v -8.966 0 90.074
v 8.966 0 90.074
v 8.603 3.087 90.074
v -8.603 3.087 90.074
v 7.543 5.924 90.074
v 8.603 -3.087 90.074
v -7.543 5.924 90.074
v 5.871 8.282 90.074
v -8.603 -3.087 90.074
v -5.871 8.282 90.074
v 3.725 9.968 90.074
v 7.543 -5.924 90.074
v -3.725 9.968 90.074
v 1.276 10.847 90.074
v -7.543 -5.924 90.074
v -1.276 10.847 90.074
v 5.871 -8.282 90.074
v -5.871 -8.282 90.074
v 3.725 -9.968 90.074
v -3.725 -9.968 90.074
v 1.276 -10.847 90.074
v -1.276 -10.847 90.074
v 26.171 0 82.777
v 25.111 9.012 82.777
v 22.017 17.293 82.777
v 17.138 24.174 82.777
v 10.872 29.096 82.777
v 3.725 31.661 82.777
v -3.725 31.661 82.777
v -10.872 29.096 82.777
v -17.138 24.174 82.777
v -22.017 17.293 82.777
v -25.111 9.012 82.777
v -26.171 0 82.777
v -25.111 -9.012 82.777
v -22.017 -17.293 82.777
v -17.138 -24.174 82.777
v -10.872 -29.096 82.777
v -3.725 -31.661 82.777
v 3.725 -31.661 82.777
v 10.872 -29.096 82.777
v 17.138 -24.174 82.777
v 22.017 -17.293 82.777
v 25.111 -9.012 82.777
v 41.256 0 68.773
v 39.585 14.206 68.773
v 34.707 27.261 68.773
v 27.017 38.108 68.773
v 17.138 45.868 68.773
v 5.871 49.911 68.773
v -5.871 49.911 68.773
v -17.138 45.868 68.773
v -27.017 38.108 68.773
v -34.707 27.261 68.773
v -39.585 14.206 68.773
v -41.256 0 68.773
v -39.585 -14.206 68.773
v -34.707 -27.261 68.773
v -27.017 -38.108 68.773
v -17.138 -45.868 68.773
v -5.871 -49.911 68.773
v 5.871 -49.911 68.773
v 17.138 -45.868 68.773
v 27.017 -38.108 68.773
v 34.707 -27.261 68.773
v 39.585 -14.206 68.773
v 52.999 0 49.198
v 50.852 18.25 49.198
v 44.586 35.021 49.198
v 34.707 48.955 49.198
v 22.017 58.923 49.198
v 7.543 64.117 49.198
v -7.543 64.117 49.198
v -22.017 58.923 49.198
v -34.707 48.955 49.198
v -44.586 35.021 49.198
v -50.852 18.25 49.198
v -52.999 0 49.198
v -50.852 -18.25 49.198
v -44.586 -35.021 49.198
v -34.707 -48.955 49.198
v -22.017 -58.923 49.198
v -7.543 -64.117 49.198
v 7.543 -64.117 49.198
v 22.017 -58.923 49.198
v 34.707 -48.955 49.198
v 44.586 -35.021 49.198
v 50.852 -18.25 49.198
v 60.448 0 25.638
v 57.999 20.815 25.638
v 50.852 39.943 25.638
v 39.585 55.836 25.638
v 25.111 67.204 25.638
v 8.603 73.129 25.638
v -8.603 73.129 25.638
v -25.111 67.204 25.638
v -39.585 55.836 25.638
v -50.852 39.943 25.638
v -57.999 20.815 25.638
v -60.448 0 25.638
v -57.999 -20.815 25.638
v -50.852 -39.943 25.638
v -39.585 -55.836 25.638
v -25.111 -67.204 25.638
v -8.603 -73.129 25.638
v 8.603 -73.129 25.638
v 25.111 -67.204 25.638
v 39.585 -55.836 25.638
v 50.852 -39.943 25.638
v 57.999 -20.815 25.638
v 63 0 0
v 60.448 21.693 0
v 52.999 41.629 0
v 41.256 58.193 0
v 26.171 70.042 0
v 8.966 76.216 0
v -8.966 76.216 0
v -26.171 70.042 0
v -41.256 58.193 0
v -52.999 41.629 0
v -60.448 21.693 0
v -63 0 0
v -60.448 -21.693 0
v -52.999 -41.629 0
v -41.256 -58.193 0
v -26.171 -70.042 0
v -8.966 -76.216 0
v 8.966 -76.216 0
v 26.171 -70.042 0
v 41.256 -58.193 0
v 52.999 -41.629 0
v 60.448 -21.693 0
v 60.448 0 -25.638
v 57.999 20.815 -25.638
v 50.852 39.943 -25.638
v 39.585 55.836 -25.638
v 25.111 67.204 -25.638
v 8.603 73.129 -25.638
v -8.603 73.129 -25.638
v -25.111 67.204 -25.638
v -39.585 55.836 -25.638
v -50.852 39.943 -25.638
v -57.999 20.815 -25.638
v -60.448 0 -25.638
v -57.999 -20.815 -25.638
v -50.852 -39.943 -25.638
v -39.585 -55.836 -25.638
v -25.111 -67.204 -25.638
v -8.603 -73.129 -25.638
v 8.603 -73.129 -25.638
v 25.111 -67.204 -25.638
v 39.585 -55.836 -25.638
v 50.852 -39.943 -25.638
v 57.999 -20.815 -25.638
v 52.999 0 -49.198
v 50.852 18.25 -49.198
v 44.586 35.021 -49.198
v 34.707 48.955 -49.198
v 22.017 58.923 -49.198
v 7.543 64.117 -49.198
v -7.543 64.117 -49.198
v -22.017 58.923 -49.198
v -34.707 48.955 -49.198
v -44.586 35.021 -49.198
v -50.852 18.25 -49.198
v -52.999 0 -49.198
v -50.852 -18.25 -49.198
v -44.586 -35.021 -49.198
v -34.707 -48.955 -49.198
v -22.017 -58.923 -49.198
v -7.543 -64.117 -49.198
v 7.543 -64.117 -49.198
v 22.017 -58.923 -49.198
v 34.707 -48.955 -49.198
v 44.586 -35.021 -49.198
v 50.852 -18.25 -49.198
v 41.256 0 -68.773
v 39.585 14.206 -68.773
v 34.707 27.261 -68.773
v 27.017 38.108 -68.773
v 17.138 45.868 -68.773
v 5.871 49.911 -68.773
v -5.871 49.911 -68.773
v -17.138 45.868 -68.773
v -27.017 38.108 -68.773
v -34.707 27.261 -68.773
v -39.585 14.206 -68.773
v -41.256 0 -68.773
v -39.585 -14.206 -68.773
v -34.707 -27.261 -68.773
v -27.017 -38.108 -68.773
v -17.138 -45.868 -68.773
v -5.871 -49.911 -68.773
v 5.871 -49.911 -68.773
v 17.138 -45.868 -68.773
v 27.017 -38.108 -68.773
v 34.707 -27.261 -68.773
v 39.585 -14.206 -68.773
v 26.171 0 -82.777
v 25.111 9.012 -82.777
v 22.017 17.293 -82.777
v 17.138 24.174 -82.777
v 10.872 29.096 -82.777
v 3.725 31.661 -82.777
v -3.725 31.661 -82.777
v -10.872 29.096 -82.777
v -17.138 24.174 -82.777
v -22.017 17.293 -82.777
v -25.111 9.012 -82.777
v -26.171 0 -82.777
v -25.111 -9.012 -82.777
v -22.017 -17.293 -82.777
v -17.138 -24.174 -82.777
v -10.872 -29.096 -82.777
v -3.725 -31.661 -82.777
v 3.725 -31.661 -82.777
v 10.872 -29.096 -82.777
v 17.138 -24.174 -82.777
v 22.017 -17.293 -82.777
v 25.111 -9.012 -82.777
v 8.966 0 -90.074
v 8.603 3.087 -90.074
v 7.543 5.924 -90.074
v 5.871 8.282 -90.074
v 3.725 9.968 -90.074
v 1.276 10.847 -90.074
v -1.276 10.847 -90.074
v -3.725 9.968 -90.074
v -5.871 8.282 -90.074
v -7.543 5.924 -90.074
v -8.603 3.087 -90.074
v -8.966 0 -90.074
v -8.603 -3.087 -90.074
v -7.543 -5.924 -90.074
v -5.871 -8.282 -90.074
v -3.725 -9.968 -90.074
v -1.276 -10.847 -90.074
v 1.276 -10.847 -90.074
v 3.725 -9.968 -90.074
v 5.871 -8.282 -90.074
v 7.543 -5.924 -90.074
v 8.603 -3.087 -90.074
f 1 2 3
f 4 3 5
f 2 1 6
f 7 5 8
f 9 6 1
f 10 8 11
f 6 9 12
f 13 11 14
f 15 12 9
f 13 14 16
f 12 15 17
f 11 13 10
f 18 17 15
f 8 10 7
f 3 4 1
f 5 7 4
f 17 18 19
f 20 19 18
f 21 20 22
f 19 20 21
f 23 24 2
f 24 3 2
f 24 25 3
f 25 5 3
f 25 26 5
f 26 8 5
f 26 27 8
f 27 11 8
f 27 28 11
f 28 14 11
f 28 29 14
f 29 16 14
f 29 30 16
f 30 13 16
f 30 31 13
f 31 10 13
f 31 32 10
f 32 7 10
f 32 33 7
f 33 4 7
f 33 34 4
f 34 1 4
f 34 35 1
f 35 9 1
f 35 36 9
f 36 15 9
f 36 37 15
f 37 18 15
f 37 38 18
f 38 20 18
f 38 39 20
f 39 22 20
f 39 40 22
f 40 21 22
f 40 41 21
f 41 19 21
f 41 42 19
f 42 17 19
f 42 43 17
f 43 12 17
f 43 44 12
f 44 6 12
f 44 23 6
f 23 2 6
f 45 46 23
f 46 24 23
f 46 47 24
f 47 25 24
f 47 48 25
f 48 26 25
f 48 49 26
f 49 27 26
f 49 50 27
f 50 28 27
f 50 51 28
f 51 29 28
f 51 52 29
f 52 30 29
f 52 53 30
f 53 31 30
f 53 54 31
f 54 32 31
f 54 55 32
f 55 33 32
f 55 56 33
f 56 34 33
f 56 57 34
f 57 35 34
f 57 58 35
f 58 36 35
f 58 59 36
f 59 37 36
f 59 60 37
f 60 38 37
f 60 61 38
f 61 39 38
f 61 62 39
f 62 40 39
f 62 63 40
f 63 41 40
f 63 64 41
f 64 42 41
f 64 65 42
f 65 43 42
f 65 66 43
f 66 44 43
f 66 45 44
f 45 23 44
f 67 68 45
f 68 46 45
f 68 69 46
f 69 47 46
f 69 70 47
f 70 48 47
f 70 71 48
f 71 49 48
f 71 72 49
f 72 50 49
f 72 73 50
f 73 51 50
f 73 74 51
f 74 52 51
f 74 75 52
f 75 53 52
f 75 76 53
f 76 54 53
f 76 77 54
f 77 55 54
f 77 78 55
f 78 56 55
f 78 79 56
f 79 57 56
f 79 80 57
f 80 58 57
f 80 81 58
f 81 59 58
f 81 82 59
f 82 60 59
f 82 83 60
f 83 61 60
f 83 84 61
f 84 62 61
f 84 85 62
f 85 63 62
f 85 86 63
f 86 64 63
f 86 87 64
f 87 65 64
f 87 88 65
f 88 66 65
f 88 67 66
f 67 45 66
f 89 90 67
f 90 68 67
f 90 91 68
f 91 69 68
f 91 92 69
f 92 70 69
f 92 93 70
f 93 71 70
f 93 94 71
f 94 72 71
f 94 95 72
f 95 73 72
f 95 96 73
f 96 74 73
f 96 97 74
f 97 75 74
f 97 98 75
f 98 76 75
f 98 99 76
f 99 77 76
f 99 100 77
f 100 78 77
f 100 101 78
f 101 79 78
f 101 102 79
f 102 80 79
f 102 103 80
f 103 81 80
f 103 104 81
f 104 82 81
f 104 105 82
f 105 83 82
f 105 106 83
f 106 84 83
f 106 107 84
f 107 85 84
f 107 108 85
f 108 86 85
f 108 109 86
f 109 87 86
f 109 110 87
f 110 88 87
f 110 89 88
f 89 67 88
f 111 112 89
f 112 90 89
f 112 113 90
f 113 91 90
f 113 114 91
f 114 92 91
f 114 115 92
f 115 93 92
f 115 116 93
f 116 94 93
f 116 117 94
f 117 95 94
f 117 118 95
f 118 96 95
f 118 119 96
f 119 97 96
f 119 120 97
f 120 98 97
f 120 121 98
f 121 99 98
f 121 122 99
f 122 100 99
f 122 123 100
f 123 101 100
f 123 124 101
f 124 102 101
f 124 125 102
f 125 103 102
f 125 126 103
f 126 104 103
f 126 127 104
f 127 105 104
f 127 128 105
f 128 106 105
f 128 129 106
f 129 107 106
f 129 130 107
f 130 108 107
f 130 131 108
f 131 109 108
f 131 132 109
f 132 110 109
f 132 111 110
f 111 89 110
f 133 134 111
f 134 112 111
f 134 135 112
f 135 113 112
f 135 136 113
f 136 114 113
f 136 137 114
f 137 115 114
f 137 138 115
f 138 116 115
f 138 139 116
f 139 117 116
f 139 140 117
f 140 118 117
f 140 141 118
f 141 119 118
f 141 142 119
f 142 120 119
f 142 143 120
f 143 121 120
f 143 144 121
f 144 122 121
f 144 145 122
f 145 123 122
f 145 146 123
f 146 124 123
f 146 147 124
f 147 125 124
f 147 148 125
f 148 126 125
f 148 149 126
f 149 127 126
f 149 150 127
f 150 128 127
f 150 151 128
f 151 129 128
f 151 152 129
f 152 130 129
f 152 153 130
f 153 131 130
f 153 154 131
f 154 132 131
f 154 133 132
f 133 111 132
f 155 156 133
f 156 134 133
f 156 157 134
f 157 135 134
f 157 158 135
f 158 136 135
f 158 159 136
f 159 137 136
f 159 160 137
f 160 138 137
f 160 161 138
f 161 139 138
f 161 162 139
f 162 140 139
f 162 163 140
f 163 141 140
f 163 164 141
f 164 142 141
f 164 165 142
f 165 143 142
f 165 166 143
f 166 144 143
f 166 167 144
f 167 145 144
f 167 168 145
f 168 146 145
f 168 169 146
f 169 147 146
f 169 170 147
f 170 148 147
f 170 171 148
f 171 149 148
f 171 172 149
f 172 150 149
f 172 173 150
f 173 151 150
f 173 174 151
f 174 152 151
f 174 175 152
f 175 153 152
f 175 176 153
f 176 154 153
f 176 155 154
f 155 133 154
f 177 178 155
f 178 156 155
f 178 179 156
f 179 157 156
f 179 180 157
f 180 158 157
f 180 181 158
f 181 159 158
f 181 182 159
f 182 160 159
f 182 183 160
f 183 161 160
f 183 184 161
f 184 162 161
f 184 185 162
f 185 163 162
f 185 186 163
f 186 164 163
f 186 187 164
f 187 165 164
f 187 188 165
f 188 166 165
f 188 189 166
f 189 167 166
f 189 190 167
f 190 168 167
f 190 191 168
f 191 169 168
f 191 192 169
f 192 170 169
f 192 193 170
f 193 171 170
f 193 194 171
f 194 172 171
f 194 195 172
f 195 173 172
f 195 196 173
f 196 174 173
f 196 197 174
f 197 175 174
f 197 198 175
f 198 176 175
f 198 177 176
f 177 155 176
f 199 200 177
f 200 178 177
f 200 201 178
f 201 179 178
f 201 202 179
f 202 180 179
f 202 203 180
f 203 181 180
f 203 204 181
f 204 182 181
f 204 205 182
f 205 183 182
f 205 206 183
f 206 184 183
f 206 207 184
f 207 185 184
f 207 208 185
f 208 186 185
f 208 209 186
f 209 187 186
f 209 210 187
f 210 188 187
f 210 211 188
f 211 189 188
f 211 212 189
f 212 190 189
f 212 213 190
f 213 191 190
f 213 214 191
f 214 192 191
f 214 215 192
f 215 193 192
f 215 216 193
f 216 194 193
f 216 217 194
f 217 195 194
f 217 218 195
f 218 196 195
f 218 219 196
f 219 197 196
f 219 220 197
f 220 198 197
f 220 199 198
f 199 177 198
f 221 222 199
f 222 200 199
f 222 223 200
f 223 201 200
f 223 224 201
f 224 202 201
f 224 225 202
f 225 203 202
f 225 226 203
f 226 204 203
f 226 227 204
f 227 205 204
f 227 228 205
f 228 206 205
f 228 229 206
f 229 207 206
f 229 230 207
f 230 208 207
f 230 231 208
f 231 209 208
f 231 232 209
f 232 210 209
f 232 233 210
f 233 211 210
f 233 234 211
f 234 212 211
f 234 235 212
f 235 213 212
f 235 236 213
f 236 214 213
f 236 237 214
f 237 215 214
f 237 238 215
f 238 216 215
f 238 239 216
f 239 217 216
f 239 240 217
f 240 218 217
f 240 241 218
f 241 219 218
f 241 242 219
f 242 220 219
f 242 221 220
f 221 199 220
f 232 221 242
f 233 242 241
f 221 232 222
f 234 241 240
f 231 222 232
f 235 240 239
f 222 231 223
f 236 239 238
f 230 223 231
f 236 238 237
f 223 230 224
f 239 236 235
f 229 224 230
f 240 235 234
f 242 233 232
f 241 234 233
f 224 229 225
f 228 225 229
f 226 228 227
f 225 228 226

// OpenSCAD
// Generated by SolidPython 1.0.1 on 2020-07-29 00:46:48


scale(v = [9, 11, 13]) {
	sphere(r = 7);
}
/***********************************************
*********      SolidPython code:      **********
************************************************
 
# import packages: SolidPython
from solid import *
from solid.utils import *
from itertools import chain, combinations, permutations


class Resize:

    def __init__(self, scad_file):
        self.scad_file = scad_file
        #self.scad_file = import_scad(scad_file)
        # cone/cylinder param:
        self.r1 = 0
        self.r2 = 0
        self.h = 0
        # rectangular prism param:
        self.w = 0
        self.l = 0
        # ellipse param:
        self.r = 0

    # import OpenScad code (file name corresponds to shape)


    # classify shape + parameters
    def assign(self, param1, param2, param3):
        if self.scad_file == 'cone.scad':
            self.r1 = param1
            self.r2 = param2
            self.h = param3
        elif self.scad_file == 'cylinder.scad':
            self.r1 = param1
            self.r2 = param2
            self.h = param3
        elif self.scad_file == 'rectangularPrism.scad':
            self.h = param1
            self.l = param2
            self.w = param3
        else:
            self.r = param1
            self.h = param2

    # resize parameters
    def iterate(self):
        x = range(3, 20, 2)
        i = 1
        if self.scad_file == 'cone.scad':
            tempList = list(permutations(x, 2))
            for temp in tempList:
                param1 = temp[0]
                param2 = temp[1]
                filepath = 'produced_scad_files/' + 'cone' + str(param1) + '_' + str(param2) + '_' + '.scad'
                scad_render_to_file(cylinder(h=param1, r1=param2, r2=0), filepath)

        elif self.scad_file == 'cylinder.scad':
            tempList = list(permutations(x, 3))
            for temp in tempList:
                param1 = temp[0]
                param2 = temp[1]
                filepath = 'produced_scad_files/' + 'cylinder' + str(param1) + '_' + str(param2) + '_' + '.scad'
                scad_render_to_file(cylinder(h=param1, r1=param2, r2=param2), filepath)

        elif self.scad_file == 'rectangularPrism.scad':
            tempList = list(permutations(x, 3))
            for temp in tempList:
                param1 = temp[0]
                param2 = temp[1]
                param3 = temp[2]
                filepath = 'produced_scad_files/' + 'rectangularPrism' + str(param1) + '_' + str(param2) + '_' + str(
                    param3) + '.scad'
                scad_render_to_file(cube(size=(param1, param2, param3)), filepath)

        elif self.scad_file == 'ellipse.scad':
            tempList = list(permutations(x, 4))
            for temp in tempList:
                param1 = temp[0]
                param2 = temp[1]
                param3 = temp[2]
                param4 = temp[3]
                filepath = 'produced_scad_files/' + 'ellipse' + str(param1) + '_' + str(param2) + '_' + str(param3) + '_' + str(param4) + '.scad'
                scad_render_to_file(scale([param1, param2, param3])(sphere(r=param4)), filepath)

    def render_to_scadfile(self):
        scad_render_to_file(scad, 'example.scad') 
 
************************************************/
